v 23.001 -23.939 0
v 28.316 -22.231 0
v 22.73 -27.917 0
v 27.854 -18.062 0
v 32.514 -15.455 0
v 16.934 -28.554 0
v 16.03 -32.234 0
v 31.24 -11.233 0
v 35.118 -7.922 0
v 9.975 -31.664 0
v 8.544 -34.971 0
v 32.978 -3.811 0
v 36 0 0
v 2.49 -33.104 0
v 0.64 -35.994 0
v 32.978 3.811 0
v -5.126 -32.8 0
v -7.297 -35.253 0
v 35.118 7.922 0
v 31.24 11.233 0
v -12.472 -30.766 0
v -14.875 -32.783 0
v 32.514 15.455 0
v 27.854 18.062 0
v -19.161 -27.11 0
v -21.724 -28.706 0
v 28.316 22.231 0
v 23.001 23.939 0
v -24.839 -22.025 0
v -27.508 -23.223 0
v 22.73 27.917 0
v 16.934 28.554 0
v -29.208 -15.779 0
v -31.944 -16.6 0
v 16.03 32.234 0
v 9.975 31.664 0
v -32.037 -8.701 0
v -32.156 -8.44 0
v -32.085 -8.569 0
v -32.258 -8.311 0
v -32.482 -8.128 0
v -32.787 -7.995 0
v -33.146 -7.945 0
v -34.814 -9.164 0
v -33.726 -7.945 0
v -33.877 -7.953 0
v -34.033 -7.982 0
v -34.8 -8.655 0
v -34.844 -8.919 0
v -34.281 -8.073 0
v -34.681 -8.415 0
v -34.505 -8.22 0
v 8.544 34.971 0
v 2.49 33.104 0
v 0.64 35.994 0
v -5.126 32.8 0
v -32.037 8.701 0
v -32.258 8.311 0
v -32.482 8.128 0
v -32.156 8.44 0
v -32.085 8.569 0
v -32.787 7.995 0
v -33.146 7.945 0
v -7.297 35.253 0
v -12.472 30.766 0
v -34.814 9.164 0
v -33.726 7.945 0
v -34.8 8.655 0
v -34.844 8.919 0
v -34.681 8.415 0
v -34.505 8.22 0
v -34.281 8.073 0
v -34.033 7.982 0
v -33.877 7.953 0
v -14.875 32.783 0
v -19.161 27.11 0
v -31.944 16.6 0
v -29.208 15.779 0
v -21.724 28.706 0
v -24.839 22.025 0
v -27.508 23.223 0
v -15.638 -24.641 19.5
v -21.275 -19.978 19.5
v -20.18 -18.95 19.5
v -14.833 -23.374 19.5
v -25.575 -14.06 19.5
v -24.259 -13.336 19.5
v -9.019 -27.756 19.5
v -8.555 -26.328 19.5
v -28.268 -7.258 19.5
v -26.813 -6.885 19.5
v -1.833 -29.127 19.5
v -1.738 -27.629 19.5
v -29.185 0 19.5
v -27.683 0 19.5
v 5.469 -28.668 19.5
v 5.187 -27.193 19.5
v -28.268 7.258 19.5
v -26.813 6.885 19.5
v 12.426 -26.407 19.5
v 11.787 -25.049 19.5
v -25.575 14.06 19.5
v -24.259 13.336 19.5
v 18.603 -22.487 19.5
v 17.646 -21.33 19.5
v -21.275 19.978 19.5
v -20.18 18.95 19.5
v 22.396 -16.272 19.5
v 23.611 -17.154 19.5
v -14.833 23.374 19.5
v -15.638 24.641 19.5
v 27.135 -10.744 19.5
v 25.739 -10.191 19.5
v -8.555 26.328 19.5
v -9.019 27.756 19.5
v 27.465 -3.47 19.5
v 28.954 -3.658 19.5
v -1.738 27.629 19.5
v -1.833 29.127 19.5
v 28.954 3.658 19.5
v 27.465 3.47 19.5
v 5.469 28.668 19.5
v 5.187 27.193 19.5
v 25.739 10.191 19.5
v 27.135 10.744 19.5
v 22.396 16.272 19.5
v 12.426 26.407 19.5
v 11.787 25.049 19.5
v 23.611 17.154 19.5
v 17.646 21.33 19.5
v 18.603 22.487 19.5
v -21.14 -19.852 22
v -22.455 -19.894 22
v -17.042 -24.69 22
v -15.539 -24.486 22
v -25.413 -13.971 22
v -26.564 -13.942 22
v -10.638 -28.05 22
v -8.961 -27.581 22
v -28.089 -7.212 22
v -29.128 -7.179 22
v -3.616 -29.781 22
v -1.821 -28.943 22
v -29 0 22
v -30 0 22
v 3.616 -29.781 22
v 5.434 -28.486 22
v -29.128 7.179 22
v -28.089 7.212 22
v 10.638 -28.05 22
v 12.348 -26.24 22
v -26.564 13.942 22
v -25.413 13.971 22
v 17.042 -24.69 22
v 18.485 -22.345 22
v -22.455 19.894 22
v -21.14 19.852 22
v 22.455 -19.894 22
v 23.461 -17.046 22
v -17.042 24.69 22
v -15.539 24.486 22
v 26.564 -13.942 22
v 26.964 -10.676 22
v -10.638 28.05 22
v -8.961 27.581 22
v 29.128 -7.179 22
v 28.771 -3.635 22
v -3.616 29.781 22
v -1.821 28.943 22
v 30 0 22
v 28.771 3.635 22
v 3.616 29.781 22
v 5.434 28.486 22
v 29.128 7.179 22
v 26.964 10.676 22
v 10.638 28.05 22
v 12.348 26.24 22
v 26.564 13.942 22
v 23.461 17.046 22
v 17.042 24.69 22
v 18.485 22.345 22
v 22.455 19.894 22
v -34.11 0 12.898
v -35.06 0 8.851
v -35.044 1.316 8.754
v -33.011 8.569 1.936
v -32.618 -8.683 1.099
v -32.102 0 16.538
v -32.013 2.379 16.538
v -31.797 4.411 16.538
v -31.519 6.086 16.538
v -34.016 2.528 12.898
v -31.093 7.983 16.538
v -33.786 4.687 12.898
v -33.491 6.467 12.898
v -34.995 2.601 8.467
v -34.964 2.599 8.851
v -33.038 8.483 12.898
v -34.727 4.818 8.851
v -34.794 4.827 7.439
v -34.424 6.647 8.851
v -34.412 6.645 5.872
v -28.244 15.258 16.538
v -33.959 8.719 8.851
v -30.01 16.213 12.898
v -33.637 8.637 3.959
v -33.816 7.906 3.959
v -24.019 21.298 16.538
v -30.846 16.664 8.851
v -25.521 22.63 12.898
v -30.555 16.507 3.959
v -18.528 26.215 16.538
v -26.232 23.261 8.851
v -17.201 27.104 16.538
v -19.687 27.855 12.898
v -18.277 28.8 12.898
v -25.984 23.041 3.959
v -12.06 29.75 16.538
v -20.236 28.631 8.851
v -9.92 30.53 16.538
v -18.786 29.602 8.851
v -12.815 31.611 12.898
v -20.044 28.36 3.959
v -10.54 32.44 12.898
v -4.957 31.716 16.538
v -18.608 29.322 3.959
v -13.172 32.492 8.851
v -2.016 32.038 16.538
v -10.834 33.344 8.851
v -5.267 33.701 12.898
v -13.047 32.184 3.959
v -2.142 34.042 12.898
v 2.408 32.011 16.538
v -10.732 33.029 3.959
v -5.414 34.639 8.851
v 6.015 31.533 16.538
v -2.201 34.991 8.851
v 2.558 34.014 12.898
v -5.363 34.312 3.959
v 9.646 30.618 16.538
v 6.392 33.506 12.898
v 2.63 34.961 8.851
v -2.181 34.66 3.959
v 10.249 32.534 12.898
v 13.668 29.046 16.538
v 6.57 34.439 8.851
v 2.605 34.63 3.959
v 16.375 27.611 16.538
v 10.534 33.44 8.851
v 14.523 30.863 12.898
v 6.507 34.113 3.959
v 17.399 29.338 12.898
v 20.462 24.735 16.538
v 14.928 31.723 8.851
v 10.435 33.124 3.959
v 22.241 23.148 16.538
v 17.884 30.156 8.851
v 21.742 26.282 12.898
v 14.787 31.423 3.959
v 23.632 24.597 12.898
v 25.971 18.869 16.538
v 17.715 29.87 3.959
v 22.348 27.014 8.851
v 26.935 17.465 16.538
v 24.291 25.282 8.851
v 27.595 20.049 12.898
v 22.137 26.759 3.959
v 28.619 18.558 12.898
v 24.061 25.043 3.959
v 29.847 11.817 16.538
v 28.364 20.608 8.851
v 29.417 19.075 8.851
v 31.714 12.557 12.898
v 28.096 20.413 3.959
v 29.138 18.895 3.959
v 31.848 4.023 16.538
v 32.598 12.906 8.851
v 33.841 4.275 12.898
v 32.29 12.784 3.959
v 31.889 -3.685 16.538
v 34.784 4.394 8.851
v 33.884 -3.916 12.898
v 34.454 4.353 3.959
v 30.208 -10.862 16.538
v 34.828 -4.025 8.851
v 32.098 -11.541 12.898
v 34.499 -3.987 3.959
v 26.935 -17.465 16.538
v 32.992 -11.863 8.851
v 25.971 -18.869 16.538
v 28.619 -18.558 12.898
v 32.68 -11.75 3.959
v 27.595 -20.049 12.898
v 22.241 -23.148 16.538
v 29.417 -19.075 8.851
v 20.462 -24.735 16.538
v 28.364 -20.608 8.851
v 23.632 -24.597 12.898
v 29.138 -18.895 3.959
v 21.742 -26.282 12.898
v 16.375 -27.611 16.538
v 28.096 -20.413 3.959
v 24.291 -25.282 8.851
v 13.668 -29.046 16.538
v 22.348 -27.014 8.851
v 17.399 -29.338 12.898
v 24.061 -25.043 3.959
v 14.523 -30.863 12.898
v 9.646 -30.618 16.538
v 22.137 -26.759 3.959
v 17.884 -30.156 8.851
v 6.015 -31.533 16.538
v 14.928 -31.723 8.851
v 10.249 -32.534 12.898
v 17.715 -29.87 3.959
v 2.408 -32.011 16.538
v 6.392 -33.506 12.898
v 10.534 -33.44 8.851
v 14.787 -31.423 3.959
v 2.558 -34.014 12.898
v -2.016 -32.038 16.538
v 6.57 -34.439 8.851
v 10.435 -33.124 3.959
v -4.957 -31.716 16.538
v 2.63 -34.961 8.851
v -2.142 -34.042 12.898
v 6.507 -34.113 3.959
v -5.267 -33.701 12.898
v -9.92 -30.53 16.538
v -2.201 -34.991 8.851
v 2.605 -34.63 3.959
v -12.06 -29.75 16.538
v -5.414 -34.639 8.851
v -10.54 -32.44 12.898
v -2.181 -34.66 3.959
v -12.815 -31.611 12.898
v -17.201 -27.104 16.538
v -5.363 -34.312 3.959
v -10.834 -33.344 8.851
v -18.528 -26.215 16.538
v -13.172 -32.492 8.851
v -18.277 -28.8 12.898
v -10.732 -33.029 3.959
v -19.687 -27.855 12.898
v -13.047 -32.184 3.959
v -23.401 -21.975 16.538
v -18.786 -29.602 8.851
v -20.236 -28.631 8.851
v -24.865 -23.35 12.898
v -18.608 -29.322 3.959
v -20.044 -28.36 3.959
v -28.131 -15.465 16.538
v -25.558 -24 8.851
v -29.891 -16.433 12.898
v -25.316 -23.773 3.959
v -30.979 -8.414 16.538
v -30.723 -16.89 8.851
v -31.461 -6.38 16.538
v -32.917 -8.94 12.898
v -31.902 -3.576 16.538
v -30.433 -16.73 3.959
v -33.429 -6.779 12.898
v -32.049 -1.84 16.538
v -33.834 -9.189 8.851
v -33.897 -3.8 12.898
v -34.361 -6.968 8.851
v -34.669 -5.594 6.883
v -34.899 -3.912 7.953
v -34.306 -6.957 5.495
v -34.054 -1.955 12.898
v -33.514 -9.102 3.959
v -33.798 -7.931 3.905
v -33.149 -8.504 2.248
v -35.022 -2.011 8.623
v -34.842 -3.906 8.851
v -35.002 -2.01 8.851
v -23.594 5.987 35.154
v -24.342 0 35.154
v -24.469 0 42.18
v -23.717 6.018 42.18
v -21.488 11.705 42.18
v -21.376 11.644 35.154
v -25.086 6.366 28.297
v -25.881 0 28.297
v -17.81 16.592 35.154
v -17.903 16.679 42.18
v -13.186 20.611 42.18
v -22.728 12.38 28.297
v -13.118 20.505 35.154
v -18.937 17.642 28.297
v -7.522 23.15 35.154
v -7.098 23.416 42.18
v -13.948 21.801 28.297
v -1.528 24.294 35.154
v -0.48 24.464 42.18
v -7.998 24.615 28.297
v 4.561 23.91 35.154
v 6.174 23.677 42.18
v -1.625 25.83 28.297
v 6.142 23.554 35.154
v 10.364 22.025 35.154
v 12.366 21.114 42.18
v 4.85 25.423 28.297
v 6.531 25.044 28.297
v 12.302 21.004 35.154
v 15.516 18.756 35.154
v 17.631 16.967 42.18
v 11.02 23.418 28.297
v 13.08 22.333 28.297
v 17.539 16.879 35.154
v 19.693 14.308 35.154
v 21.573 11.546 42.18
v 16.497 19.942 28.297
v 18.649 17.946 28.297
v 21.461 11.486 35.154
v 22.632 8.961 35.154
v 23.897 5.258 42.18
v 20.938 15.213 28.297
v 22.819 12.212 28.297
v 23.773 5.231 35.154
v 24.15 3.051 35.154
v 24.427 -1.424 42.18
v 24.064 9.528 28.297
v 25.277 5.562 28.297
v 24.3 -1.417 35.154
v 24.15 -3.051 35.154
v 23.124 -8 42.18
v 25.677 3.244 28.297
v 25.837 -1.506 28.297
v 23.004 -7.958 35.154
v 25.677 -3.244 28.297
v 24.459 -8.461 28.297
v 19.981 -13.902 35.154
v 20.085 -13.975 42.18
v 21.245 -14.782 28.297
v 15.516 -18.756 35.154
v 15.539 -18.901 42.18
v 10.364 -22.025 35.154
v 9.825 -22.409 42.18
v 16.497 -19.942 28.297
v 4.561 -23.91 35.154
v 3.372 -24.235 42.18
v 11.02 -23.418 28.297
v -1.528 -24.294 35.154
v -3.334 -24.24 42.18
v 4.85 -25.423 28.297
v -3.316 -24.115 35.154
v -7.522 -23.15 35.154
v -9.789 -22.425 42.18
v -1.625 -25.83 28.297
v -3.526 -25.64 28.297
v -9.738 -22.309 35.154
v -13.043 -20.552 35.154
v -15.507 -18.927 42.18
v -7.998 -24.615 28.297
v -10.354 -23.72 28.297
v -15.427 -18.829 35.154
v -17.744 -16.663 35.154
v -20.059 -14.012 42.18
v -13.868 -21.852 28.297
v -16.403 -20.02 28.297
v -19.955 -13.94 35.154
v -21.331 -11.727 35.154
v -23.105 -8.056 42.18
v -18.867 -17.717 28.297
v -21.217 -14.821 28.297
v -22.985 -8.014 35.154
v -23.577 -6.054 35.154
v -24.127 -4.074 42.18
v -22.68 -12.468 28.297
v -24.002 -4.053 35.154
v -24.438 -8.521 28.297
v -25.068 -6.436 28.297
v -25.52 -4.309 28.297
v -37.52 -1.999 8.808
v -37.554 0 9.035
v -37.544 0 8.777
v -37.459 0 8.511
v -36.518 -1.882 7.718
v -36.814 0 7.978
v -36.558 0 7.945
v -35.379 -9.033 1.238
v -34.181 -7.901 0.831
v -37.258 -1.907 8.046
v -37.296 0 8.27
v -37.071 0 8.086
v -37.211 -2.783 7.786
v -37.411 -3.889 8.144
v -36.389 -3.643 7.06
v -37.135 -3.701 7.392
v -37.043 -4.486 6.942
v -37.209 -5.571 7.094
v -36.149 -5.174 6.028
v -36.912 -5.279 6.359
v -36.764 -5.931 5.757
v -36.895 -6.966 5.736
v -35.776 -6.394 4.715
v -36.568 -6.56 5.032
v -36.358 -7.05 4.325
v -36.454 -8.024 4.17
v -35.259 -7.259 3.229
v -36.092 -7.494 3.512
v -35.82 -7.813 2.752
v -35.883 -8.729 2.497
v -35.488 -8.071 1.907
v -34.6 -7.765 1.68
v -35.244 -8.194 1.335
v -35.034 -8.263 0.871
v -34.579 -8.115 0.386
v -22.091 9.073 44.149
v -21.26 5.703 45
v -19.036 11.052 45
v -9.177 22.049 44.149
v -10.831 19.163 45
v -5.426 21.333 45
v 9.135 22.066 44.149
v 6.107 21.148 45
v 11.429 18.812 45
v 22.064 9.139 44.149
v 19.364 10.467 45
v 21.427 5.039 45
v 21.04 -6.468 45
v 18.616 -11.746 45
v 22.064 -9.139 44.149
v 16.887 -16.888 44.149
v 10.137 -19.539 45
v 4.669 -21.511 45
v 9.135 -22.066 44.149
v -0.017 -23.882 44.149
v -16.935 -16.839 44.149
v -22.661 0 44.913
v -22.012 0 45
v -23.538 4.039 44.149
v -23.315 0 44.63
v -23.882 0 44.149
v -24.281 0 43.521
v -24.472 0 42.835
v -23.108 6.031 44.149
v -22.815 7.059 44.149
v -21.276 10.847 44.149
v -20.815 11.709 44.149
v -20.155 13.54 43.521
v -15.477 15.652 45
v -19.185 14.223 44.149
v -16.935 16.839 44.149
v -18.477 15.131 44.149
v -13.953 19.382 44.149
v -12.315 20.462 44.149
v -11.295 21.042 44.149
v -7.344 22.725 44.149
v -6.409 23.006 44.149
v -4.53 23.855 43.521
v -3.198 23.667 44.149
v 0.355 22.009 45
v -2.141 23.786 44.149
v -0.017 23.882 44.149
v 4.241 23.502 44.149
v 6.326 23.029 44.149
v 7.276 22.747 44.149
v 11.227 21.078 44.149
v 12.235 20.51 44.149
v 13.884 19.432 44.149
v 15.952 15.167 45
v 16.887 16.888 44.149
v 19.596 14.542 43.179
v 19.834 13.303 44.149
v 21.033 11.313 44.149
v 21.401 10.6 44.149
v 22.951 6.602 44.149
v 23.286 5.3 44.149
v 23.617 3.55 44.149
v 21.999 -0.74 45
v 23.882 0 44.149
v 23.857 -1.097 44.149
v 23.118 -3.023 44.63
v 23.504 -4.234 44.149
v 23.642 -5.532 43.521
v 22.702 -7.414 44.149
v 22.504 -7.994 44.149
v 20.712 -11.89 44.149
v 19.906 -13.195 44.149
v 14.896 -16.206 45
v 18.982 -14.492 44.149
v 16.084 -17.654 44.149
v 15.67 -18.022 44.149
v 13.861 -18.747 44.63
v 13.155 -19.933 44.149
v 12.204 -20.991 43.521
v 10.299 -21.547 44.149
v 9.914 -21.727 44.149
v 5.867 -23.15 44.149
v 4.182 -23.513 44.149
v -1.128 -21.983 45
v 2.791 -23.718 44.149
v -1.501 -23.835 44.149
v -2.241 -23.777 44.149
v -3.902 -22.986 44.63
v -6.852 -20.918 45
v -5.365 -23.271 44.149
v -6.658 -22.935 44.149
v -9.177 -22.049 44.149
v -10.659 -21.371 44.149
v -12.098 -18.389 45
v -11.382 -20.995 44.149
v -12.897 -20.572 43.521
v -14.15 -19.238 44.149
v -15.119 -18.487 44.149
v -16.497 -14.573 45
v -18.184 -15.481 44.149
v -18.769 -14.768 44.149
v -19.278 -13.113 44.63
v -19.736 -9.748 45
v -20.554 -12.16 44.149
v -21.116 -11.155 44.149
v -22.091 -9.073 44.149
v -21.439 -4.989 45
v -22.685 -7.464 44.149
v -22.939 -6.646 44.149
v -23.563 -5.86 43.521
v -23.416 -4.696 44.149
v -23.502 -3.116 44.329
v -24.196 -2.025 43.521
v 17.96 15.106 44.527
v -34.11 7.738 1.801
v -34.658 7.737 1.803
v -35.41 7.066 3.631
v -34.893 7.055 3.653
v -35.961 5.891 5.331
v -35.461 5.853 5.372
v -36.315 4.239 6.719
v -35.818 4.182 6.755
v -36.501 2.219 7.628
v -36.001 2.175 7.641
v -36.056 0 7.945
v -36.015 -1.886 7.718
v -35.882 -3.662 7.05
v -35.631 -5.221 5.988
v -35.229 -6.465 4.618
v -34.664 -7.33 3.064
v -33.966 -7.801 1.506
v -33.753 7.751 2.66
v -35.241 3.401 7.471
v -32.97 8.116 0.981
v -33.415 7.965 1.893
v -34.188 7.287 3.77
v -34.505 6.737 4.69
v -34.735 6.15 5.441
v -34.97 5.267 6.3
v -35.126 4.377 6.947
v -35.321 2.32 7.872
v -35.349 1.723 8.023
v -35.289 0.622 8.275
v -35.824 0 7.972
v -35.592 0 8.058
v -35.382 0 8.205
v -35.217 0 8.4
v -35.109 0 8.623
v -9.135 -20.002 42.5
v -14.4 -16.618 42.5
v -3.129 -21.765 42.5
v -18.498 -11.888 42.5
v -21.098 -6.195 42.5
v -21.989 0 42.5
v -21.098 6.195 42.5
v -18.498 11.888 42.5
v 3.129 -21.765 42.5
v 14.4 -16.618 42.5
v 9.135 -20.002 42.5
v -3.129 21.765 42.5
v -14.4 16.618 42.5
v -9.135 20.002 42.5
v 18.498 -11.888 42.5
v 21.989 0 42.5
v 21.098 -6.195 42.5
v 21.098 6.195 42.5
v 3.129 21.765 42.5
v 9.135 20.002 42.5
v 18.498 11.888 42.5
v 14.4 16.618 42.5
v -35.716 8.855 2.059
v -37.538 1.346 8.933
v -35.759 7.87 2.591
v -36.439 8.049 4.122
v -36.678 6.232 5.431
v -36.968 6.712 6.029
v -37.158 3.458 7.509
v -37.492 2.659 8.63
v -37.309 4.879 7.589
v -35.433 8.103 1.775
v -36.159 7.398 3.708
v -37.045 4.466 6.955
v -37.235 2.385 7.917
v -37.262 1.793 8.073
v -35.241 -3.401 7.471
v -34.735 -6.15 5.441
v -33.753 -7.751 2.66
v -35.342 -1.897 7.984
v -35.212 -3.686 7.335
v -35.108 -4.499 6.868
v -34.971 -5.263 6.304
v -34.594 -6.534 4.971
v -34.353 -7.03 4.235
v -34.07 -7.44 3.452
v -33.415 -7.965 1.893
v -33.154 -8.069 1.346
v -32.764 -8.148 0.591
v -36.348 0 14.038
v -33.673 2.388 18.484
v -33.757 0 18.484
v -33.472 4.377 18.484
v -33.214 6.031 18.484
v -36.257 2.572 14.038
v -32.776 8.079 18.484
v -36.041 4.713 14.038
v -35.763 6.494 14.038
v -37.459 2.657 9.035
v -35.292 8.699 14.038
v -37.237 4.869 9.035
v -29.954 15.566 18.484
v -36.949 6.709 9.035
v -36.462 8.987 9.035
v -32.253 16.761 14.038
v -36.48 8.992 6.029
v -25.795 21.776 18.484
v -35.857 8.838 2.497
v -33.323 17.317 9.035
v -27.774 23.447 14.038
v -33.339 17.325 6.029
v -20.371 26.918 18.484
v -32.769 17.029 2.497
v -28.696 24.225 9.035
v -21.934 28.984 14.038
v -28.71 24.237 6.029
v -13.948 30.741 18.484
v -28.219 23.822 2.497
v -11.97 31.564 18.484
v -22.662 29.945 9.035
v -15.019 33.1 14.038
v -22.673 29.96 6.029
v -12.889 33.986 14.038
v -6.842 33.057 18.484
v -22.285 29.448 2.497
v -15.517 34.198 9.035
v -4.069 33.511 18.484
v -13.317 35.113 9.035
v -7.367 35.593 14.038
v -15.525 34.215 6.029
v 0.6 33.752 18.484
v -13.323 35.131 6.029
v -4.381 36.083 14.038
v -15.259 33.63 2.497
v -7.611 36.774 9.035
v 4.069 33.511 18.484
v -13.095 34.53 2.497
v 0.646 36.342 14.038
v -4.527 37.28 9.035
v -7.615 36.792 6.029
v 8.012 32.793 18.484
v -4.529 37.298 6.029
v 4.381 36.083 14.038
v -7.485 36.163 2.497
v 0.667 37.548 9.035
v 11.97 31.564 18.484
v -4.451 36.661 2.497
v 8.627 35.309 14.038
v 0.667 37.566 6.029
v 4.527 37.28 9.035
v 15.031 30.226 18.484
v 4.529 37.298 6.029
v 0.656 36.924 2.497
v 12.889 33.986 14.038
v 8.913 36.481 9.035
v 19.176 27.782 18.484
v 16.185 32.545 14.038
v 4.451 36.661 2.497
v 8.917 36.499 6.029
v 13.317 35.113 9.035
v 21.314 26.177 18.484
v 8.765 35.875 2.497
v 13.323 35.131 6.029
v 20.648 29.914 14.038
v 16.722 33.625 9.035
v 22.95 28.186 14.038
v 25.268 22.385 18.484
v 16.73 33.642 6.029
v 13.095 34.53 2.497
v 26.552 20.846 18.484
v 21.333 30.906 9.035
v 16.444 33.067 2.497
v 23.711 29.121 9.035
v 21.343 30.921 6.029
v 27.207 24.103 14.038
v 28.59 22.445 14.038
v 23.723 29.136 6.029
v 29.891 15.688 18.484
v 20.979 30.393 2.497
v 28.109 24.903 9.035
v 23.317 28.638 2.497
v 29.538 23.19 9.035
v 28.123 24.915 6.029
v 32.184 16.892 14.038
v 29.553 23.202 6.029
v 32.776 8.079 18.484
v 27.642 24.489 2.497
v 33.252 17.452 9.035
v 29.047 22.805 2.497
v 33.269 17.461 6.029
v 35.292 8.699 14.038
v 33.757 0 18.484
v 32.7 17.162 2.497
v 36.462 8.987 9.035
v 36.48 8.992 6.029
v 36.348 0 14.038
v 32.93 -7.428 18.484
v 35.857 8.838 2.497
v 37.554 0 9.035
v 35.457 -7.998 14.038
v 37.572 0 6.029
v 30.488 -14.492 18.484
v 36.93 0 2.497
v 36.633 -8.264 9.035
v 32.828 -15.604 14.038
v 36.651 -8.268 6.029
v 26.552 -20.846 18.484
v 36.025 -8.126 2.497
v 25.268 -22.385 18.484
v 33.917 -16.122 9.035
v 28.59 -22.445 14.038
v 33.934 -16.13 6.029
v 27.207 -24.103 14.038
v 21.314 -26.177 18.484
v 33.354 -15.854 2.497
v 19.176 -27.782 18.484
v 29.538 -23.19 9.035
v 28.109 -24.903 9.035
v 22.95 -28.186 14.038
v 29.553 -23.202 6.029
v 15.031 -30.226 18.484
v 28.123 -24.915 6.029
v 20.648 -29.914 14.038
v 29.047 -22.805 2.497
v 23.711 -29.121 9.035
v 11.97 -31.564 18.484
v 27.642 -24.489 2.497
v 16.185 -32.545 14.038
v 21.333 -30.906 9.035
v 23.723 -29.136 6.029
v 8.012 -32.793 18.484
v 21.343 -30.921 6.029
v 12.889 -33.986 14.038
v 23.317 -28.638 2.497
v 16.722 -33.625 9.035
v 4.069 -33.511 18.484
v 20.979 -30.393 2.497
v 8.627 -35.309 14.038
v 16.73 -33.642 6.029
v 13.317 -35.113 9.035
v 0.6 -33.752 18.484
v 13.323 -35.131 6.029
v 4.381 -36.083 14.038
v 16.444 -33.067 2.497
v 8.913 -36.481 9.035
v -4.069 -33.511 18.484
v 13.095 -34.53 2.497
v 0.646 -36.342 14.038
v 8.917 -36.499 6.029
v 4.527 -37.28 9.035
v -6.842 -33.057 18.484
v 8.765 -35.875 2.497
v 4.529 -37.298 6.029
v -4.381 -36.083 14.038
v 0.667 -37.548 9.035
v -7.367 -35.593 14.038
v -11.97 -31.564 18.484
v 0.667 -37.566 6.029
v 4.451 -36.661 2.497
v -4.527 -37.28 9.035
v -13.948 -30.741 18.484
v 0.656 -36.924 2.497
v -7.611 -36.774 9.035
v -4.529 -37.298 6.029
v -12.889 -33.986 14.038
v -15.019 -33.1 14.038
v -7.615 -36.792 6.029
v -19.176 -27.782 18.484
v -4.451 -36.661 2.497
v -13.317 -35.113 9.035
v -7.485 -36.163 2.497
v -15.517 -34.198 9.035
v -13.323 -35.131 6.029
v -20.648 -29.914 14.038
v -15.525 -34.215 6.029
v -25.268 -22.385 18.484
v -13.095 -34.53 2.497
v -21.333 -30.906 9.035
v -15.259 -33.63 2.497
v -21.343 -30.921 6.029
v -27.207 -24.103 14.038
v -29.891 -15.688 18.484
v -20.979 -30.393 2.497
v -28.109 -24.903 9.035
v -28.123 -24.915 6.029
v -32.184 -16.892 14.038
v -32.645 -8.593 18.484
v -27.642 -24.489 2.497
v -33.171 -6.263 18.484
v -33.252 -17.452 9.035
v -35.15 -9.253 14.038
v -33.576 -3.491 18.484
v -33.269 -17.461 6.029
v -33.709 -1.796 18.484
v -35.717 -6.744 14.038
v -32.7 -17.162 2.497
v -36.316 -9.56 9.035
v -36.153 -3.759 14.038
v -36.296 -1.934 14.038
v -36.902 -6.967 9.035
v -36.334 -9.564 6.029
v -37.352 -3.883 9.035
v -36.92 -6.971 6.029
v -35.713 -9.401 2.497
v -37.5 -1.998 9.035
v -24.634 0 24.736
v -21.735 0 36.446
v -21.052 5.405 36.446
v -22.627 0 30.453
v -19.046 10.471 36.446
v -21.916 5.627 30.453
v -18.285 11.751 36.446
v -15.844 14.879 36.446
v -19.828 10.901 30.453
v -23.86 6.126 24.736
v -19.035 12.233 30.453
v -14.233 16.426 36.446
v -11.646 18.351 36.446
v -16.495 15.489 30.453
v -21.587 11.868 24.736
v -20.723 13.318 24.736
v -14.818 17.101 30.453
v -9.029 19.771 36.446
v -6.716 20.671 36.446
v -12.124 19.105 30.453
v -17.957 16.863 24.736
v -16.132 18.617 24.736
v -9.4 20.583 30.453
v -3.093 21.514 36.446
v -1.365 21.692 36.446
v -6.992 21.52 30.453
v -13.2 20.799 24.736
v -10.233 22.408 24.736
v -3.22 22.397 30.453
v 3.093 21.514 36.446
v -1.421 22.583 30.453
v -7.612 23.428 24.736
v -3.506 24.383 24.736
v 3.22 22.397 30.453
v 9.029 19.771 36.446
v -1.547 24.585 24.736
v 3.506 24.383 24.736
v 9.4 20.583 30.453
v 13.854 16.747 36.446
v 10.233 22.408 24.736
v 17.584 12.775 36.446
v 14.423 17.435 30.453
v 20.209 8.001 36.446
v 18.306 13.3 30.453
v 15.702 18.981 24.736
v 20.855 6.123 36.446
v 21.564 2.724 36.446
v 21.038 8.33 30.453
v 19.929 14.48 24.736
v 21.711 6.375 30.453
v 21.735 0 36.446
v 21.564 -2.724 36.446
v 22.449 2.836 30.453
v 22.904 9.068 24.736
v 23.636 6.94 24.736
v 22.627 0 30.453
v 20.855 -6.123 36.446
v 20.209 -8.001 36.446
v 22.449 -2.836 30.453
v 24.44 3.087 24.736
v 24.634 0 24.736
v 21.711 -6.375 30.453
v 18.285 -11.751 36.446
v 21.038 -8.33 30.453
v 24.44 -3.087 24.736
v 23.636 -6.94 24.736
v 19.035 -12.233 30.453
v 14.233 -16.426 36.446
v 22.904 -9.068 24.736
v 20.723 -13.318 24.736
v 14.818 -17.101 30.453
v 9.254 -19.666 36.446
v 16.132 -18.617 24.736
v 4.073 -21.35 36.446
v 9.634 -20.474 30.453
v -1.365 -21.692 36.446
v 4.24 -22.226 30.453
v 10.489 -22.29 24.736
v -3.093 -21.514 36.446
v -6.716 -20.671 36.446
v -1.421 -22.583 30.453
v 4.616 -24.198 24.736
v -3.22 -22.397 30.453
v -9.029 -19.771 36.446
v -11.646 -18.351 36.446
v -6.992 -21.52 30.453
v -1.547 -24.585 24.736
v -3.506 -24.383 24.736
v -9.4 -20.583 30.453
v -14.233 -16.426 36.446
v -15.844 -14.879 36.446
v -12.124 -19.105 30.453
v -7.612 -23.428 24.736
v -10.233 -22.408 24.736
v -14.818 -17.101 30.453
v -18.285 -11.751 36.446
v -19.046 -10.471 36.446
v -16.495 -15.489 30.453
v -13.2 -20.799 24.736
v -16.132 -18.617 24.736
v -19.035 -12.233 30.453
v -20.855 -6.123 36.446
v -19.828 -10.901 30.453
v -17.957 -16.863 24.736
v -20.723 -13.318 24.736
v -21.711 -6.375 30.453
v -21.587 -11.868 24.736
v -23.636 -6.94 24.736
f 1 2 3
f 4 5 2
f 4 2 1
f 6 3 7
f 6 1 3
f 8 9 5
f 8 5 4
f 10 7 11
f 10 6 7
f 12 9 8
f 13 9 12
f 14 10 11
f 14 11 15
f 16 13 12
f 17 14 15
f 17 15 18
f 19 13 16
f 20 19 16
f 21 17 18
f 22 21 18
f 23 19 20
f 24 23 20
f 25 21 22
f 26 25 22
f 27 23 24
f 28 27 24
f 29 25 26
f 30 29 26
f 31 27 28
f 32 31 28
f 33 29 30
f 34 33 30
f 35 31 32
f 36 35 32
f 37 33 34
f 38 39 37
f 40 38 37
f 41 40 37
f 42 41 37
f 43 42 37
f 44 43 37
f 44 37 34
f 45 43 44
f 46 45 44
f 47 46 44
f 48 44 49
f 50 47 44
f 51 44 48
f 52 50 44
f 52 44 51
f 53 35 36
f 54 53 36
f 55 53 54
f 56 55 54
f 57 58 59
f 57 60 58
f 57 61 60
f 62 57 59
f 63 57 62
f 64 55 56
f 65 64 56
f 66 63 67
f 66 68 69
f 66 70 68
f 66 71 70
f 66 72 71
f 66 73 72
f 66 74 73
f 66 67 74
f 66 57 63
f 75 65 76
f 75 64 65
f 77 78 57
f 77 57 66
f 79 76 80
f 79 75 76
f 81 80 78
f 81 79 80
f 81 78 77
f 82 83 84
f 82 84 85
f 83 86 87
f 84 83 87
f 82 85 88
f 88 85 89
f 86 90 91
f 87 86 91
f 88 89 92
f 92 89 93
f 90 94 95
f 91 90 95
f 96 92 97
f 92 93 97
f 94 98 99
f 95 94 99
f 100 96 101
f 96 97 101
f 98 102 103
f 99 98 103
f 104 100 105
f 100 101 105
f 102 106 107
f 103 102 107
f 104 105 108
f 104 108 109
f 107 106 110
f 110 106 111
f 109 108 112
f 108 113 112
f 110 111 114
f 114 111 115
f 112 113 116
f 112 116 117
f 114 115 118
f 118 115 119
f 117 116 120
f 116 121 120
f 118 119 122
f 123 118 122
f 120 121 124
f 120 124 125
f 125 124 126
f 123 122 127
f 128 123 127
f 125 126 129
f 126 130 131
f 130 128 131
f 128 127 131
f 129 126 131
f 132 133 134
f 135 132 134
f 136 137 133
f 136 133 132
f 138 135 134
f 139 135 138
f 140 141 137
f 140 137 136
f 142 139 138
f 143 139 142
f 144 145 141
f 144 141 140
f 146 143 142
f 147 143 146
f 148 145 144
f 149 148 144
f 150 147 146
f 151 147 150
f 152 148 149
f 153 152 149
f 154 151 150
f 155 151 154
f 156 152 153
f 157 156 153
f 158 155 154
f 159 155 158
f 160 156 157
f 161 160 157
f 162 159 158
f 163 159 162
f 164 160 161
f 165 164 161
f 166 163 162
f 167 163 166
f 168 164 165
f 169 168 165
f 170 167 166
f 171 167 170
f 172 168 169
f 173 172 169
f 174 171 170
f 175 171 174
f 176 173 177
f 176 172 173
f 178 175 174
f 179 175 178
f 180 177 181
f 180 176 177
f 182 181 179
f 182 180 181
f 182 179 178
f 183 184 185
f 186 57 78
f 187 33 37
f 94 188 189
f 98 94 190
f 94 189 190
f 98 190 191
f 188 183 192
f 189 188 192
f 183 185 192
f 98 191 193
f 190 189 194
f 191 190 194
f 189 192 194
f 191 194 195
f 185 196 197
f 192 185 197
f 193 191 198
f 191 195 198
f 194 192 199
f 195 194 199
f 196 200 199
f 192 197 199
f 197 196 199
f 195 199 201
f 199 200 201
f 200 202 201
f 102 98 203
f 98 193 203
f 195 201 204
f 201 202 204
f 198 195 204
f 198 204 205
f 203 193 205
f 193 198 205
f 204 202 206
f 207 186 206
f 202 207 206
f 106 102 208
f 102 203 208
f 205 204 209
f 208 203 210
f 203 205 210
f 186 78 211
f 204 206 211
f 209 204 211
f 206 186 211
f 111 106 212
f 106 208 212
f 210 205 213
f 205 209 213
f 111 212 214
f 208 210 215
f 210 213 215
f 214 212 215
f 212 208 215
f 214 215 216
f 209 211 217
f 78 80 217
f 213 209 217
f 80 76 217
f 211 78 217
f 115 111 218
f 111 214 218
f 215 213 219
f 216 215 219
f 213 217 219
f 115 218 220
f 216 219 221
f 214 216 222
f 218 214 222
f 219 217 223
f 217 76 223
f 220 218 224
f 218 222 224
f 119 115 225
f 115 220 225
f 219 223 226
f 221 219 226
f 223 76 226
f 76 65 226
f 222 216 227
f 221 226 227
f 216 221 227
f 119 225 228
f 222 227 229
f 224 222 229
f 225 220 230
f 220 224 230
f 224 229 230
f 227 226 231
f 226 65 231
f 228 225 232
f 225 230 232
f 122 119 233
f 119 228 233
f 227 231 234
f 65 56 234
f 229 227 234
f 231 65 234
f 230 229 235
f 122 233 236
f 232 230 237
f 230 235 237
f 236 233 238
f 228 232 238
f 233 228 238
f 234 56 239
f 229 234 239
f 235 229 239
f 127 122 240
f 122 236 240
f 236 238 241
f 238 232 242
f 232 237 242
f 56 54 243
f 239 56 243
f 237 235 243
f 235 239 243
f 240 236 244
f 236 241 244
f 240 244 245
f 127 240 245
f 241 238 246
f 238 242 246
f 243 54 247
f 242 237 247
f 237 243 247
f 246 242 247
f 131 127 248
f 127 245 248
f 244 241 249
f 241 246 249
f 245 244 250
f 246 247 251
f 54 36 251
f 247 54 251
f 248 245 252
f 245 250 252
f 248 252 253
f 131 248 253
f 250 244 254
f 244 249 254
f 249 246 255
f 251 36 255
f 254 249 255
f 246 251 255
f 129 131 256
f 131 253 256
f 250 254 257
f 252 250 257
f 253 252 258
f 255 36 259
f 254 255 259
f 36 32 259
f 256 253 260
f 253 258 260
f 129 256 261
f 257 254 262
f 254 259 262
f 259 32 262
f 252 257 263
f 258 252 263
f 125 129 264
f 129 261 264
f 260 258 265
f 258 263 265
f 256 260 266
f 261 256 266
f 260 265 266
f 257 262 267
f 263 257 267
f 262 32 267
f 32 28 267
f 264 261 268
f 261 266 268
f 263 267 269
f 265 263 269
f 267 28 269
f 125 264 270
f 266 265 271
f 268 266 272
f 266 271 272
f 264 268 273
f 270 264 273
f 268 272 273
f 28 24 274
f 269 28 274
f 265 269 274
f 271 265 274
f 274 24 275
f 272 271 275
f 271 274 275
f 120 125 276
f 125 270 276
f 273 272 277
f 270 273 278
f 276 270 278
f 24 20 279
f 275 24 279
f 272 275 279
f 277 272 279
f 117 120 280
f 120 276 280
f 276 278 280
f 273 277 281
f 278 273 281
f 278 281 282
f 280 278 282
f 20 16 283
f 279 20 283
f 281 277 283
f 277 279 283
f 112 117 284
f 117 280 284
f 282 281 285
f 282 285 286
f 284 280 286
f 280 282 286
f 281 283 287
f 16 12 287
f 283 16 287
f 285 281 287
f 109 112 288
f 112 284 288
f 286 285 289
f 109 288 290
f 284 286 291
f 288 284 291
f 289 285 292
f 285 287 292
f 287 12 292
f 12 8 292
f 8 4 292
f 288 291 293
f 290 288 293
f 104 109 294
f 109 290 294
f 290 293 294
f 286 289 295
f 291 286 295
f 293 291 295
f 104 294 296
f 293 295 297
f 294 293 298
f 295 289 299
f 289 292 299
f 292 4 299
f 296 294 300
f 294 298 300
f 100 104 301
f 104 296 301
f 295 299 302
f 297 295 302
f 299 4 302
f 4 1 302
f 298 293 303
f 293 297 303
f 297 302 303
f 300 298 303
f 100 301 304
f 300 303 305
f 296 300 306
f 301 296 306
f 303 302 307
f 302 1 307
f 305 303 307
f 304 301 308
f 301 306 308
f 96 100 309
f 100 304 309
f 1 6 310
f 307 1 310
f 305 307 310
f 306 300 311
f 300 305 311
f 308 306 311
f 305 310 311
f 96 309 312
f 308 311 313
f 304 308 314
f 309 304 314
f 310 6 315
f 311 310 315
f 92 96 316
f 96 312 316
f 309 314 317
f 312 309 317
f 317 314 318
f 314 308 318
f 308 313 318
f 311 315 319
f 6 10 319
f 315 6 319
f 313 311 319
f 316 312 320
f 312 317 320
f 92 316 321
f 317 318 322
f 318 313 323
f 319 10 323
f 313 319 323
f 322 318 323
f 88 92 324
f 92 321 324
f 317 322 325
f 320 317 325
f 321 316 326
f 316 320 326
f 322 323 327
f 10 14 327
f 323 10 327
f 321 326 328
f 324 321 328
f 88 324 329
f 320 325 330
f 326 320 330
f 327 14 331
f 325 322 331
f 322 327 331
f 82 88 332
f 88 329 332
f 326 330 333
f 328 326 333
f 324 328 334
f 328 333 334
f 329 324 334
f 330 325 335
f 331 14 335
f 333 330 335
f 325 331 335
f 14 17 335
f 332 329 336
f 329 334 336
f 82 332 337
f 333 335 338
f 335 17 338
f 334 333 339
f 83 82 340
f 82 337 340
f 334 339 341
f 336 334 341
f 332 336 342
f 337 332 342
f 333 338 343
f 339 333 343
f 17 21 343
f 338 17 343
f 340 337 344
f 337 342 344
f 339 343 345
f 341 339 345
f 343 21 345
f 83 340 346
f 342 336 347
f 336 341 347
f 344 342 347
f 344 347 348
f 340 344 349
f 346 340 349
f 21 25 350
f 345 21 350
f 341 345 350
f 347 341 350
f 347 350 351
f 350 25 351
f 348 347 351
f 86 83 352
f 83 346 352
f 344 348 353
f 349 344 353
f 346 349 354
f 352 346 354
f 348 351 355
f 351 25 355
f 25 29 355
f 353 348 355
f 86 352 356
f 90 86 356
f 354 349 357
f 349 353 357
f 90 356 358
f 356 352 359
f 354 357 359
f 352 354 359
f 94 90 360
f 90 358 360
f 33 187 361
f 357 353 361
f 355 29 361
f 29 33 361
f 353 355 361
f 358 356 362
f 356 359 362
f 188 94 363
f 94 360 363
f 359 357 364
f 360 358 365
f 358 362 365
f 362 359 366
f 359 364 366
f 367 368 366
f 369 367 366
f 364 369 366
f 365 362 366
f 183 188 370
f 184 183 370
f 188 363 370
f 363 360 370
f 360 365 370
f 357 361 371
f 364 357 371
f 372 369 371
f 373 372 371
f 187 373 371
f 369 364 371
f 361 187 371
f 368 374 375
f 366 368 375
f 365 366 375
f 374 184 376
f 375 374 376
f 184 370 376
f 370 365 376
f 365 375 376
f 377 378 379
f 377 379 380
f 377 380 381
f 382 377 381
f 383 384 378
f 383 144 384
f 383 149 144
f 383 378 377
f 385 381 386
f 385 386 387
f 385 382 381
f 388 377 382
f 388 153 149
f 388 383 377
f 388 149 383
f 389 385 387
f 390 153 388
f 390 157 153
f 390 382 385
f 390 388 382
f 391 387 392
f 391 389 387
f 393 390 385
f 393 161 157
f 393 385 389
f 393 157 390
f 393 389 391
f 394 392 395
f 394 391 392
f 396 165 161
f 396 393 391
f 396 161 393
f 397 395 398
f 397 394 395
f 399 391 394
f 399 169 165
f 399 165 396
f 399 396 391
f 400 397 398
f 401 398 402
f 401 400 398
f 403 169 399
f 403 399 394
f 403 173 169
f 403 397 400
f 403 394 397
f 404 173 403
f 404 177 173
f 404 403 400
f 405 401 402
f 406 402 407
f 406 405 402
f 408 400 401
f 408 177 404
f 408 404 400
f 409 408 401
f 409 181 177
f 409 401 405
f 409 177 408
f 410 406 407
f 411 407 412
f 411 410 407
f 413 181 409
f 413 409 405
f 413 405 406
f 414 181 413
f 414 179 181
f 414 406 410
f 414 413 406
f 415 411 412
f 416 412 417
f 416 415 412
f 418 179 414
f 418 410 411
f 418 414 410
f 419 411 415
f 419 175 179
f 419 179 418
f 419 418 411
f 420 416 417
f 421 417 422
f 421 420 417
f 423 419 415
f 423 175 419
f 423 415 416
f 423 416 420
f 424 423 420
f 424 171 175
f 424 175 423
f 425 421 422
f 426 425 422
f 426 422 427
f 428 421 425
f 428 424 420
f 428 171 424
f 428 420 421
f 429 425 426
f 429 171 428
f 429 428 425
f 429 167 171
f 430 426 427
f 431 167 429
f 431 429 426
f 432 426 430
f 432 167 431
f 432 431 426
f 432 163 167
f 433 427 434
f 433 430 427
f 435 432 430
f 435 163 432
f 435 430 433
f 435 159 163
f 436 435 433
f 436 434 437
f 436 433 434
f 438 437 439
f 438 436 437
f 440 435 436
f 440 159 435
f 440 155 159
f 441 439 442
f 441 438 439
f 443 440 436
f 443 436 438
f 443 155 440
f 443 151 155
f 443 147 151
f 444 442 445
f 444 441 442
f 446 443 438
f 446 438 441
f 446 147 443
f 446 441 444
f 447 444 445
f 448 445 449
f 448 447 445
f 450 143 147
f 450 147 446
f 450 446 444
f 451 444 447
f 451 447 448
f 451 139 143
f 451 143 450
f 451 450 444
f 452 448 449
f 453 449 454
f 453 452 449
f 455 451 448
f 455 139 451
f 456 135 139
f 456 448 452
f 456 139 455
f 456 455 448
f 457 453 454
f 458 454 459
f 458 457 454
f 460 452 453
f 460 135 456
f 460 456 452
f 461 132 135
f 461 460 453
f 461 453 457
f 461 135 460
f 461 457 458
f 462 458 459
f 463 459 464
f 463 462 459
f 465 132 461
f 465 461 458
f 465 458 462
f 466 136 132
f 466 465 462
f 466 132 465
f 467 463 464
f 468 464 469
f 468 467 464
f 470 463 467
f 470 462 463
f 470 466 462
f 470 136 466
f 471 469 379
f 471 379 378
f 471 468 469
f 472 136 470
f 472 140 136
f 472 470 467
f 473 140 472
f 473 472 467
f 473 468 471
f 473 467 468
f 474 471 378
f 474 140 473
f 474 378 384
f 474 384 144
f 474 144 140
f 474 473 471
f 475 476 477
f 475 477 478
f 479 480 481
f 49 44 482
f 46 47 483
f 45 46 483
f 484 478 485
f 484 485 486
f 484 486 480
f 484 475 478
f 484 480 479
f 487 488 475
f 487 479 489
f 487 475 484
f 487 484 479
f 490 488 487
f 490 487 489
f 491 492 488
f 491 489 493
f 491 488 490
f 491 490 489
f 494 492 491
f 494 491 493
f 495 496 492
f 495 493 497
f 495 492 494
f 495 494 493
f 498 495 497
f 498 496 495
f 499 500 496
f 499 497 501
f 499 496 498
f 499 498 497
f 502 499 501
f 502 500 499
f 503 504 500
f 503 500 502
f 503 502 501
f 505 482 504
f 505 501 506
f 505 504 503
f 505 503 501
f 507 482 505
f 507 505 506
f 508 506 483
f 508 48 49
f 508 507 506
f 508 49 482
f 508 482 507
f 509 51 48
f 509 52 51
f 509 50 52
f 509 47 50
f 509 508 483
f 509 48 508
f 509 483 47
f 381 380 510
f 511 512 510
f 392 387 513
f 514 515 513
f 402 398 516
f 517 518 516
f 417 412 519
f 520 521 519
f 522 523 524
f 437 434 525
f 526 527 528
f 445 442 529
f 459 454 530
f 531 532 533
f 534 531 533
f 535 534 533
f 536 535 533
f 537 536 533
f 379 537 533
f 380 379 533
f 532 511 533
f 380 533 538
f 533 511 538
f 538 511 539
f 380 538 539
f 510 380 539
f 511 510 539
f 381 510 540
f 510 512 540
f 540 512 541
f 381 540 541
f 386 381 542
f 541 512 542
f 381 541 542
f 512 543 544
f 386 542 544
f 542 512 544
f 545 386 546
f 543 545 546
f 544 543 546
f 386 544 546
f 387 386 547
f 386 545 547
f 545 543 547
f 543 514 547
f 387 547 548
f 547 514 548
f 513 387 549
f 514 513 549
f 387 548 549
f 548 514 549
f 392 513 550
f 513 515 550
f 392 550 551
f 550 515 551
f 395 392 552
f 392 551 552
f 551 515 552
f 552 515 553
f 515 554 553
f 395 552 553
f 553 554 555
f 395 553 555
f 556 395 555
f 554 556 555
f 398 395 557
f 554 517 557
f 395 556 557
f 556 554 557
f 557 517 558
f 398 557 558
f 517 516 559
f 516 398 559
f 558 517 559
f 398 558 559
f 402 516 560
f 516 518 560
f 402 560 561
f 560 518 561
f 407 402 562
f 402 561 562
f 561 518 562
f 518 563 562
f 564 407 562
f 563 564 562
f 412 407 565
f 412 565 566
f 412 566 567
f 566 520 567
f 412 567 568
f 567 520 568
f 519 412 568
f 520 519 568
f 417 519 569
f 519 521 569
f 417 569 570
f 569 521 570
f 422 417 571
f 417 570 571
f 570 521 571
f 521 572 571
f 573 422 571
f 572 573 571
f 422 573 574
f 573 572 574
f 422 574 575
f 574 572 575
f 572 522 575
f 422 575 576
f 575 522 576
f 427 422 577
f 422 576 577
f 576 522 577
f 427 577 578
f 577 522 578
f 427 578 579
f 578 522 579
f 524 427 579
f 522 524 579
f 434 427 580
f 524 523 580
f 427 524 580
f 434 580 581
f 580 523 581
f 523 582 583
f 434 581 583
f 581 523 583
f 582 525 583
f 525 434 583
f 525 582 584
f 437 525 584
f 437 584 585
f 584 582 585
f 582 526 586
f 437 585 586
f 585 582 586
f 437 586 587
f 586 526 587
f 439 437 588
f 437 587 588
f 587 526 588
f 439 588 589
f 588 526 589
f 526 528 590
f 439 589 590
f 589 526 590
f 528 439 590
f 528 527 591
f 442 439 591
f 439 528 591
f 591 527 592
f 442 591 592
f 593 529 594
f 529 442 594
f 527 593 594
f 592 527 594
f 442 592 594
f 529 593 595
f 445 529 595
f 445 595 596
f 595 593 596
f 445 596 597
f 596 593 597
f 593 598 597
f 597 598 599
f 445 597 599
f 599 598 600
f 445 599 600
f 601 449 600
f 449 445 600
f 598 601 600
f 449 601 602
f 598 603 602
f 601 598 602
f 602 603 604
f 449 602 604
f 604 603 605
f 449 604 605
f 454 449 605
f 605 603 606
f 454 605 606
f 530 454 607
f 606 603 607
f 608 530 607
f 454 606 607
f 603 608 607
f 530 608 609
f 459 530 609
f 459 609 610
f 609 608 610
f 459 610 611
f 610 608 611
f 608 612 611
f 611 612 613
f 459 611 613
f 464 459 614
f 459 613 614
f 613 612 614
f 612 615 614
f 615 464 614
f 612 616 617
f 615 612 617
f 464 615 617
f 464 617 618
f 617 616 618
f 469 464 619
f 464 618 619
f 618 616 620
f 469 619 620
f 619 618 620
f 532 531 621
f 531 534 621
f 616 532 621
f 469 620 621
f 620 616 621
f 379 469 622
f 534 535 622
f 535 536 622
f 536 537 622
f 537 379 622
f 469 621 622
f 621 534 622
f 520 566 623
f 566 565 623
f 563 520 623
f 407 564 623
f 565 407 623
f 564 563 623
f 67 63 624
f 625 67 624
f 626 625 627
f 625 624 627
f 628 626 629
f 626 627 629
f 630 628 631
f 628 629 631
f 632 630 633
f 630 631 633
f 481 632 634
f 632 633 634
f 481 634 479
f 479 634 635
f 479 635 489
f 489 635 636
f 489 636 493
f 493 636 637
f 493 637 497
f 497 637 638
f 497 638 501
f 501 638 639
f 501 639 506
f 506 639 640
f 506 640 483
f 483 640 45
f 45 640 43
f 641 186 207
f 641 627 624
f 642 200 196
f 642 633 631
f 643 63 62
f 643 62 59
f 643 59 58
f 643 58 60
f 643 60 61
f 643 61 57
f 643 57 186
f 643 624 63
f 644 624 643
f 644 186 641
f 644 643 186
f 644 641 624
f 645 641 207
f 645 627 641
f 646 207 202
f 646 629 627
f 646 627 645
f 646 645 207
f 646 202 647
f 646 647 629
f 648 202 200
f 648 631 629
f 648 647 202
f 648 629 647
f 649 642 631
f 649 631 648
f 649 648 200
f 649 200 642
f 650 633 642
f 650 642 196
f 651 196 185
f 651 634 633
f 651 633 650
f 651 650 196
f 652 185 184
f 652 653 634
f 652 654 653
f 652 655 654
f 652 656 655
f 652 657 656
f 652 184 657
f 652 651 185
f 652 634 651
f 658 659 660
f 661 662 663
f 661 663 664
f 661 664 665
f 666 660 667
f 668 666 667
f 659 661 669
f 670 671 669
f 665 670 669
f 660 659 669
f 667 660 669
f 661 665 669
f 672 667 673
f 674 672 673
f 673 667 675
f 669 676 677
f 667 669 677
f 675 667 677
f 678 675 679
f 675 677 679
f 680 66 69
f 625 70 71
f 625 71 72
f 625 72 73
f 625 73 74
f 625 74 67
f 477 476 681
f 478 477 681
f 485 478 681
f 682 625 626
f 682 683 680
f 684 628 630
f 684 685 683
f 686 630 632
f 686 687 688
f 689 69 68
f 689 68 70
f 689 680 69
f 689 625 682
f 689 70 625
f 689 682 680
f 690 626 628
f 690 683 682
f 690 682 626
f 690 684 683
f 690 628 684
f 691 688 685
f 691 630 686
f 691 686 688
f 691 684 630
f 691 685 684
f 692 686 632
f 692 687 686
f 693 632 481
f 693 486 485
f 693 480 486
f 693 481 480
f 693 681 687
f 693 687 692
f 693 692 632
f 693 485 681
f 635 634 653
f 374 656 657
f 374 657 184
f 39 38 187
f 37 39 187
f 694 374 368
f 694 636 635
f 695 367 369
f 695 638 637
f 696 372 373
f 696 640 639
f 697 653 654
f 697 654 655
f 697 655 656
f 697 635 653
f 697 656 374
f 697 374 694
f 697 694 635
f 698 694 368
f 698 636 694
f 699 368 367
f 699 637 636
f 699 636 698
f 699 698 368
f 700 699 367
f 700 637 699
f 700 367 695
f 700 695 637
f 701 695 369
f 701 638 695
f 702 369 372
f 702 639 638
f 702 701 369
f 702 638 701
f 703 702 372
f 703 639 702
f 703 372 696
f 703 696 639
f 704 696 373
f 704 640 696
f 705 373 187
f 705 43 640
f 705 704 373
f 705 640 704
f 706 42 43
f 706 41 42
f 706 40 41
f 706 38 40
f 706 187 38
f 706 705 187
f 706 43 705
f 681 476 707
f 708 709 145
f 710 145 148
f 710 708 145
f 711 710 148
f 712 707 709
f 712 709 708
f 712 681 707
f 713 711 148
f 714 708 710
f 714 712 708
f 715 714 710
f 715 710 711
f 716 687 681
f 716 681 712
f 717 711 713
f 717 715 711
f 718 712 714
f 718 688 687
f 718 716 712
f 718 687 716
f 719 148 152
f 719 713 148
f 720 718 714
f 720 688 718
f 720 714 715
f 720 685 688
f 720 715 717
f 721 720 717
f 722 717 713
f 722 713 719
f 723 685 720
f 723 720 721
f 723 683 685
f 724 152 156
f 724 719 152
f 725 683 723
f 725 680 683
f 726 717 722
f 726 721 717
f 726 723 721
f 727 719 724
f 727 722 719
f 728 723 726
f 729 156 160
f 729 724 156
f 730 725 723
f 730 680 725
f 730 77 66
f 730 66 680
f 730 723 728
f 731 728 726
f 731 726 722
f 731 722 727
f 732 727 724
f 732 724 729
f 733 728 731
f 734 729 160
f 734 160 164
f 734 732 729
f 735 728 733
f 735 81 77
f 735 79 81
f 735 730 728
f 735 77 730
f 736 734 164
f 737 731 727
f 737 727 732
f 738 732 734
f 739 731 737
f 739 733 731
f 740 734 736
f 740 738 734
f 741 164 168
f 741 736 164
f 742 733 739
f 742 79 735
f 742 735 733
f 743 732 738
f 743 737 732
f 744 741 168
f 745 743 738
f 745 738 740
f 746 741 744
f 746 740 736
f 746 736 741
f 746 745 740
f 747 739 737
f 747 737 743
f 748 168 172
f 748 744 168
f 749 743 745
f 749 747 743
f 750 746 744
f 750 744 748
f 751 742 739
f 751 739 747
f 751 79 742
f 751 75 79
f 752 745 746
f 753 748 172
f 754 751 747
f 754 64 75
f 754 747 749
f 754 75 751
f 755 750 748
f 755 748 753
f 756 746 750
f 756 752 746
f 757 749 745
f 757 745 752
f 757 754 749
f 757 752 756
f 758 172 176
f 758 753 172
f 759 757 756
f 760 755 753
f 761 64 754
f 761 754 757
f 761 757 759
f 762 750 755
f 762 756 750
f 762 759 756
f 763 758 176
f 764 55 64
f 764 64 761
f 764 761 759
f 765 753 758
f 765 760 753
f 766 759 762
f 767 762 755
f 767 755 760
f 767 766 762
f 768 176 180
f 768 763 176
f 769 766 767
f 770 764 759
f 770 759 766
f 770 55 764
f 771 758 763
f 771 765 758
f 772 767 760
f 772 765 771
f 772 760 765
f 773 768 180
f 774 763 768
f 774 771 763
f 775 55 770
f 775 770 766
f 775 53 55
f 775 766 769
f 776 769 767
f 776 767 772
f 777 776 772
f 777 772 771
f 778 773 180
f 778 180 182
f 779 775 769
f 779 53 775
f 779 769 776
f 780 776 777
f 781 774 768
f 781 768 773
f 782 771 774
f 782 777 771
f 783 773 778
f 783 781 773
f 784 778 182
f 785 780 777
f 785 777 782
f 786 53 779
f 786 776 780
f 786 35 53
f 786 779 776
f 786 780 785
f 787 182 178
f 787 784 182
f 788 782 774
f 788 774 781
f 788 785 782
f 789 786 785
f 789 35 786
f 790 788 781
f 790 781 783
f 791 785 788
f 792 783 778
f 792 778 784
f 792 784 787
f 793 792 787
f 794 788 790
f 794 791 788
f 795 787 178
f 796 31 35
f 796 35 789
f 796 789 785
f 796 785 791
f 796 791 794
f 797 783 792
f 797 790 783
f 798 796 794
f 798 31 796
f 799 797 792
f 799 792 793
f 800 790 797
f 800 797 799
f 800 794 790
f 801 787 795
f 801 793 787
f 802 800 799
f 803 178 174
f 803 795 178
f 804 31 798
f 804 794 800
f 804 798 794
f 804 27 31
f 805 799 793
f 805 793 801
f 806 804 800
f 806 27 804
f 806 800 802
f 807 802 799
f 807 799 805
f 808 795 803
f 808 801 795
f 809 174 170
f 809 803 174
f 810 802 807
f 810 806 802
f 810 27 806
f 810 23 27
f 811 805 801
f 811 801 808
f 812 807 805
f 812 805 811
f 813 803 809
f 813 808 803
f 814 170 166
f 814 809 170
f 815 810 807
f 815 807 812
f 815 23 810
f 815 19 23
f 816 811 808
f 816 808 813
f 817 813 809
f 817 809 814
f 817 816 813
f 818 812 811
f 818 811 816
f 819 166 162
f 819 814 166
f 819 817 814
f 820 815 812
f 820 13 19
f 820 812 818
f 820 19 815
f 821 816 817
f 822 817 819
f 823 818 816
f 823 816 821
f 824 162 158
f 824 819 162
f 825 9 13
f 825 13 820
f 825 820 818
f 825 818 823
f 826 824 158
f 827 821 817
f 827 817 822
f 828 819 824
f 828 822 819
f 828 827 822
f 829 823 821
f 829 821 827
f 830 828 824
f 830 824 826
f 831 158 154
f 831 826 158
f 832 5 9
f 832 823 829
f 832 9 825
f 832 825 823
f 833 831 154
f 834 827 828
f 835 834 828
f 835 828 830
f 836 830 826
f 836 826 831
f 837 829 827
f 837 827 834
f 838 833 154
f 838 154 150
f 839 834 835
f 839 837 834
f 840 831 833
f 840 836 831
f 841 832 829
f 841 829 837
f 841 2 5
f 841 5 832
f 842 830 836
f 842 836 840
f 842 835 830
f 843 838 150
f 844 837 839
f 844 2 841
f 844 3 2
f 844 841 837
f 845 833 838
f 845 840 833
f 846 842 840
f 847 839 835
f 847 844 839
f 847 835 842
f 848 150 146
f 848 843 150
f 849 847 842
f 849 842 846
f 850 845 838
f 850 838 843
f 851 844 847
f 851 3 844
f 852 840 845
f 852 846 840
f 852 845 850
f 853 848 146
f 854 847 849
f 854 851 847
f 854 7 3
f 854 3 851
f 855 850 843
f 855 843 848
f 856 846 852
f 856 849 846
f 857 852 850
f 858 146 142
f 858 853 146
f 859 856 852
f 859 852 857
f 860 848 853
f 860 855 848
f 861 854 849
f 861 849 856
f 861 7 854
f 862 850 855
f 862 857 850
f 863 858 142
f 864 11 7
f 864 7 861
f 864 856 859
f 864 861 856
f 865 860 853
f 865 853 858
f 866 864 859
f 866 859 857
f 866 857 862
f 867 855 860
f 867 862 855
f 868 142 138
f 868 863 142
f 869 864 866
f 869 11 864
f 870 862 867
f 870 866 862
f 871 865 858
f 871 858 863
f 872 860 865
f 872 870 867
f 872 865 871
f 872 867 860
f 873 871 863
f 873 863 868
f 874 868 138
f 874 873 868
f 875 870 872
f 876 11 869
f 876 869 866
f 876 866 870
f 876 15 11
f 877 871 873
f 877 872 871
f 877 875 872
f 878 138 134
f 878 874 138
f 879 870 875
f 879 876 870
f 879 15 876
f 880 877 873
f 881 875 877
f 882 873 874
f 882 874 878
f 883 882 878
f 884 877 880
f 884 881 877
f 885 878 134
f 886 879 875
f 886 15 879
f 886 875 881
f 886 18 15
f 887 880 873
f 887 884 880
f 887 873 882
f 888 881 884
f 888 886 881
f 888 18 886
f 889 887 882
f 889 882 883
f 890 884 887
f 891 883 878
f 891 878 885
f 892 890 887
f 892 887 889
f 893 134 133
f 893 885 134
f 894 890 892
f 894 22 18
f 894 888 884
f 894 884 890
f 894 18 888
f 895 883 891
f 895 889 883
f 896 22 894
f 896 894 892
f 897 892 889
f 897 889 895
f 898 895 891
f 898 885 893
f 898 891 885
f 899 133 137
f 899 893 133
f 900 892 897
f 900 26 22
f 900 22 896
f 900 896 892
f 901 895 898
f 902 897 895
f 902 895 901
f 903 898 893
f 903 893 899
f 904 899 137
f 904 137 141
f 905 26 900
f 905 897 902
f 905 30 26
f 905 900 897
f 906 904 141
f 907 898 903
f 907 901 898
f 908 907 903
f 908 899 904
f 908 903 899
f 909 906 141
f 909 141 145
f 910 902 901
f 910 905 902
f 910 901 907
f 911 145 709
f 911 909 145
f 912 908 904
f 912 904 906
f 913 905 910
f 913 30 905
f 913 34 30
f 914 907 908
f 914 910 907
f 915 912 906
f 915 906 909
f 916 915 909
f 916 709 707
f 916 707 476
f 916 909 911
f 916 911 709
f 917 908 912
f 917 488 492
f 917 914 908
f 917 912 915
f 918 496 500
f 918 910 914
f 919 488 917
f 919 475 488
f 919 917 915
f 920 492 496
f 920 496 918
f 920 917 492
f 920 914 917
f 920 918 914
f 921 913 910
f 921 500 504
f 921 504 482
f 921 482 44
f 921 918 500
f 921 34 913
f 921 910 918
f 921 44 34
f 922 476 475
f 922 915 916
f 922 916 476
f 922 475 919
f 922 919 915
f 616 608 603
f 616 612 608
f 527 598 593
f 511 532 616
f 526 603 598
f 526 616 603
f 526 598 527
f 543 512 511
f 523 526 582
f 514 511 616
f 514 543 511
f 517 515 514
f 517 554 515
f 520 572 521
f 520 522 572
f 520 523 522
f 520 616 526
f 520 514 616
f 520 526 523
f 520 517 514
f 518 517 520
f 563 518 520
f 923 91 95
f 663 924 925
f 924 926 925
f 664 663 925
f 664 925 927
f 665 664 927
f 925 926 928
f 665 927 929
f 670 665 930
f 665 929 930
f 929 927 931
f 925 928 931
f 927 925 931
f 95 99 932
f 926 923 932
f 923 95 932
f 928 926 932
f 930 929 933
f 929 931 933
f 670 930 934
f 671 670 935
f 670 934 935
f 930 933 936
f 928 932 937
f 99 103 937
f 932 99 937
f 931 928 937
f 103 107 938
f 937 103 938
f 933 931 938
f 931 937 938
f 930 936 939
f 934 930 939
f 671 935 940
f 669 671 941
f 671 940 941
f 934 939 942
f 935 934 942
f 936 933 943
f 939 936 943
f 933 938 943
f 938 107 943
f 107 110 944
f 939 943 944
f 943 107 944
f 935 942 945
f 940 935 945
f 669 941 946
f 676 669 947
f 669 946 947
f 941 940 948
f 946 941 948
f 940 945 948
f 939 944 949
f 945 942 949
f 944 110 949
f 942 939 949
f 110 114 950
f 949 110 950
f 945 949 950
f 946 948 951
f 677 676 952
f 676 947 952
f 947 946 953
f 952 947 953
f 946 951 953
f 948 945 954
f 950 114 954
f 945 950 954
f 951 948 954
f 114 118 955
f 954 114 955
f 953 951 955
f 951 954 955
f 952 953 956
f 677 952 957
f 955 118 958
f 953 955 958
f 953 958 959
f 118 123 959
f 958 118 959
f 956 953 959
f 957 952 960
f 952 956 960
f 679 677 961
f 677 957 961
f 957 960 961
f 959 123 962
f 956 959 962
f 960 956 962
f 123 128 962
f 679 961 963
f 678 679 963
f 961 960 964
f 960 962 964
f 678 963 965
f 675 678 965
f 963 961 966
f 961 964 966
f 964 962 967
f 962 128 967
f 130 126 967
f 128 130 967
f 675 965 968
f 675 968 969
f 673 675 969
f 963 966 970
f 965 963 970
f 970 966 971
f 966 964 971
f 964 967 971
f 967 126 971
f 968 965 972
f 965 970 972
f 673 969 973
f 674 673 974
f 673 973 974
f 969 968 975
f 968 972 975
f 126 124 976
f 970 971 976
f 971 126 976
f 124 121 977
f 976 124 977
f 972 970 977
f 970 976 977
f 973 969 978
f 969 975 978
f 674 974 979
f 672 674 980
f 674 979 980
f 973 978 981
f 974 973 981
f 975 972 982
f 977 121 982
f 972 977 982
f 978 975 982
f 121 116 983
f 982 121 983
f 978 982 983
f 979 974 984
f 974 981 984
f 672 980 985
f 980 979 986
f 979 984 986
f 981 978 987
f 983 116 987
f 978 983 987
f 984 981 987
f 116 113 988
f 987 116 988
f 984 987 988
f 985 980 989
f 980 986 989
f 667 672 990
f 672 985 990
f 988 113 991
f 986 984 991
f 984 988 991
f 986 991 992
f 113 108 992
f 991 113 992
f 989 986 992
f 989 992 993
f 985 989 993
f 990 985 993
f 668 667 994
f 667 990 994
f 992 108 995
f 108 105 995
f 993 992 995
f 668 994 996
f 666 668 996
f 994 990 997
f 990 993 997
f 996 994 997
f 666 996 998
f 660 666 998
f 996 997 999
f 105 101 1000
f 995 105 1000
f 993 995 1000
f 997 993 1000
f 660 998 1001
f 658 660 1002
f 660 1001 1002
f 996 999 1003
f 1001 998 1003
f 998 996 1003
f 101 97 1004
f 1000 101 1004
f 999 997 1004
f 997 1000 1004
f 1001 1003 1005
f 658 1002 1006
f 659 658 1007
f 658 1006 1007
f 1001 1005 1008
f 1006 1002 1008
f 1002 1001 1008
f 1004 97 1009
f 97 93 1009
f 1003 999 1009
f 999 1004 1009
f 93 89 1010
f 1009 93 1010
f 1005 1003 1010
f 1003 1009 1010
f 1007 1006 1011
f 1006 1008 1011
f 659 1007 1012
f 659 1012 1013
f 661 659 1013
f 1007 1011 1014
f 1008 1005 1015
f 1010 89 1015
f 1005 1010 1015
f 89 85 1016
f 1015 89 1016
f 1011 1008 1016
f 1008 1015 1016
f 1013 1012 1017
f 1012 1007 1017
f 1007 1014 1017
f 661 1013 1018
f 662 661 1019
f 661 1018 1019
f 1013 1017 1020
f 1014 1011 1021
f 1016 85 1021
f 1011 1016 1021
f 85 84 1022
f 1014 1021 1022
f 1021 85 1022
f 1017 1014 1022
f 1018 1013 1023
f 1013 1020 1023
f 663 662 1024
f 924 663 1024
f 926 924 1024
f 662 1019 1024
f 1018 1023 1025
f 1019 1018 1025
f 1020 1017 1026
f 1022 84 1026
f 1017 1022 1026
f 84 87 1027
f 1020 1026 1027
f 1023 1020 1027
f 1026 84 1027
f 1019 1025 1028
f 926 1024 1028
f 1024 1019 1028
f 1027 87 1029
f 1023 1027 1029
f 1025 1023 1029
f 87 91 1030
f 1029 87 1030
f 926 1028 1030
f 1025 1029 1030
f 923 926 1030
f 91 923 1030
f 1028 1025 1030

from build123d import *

# Parameters (mm, degrees)
F2_T     = -2.5
F3_R     = 2.4801912713
F4_R     = 7.9445476456
F5_DEPTH = 121.4
F6_R     = 1


with BuildPart() as f1:
    # F0 (on Front) → F1 (revolve)
    with BuildSketch(Plane.XZ):
        with BuildLine():
            Line((-36, 0), (0, 0))
            Line((0, 0), (0, 45))
            Line((0, 45), (-25, 45))
            ThreePointArc((-25, 45), (-24.6260993655, 33.0871477157), (-29, 22))
            Line((-29, 22), (-30, 22))
            ThreePointArc((-30, 22), (-37.0017950758, 12.091398657), (-36, 0))
        make_face()
    revolve(axis=Axis((0, 0, 22.5), (0, 0, -1)))

    # F2
    f2_openings = [f1.faces().sort_by_distance(p)[0] for p in [
        (0, 0, 0),
    ]]
    offset(amount=F2_T, openings=f2_openings, kind=Kind.INTERSECTION)

    # F3
    f3_edges = [f1.edges().sort_by_distance(p)[0] for p in [
        (25, 0, 45),
    ]]
    fillet(f3_edges, radius=F3_R)

    # F4 (on Right) → F5 (cut)
    with BuildSketch(Plane.YZ):
        Circle(F4_R)
    extrude(amount=-F5_DEPTH, mode=Mode.SUBTRACT)

    # F6
    f6_edges = [f1.edges().sort_by_distance(p)[0] for p in [
        (-37.084919, 5.722187, 5.511117),
        (-37.084919, -5.722187, 5.511117),
        (-34.524365, 5.760394, 5.47117),
        (-34.524365, -5.760394, 5.47117),
    ]]
    fillet(f6_edges, radius=F6_R)


solid = f1.part
